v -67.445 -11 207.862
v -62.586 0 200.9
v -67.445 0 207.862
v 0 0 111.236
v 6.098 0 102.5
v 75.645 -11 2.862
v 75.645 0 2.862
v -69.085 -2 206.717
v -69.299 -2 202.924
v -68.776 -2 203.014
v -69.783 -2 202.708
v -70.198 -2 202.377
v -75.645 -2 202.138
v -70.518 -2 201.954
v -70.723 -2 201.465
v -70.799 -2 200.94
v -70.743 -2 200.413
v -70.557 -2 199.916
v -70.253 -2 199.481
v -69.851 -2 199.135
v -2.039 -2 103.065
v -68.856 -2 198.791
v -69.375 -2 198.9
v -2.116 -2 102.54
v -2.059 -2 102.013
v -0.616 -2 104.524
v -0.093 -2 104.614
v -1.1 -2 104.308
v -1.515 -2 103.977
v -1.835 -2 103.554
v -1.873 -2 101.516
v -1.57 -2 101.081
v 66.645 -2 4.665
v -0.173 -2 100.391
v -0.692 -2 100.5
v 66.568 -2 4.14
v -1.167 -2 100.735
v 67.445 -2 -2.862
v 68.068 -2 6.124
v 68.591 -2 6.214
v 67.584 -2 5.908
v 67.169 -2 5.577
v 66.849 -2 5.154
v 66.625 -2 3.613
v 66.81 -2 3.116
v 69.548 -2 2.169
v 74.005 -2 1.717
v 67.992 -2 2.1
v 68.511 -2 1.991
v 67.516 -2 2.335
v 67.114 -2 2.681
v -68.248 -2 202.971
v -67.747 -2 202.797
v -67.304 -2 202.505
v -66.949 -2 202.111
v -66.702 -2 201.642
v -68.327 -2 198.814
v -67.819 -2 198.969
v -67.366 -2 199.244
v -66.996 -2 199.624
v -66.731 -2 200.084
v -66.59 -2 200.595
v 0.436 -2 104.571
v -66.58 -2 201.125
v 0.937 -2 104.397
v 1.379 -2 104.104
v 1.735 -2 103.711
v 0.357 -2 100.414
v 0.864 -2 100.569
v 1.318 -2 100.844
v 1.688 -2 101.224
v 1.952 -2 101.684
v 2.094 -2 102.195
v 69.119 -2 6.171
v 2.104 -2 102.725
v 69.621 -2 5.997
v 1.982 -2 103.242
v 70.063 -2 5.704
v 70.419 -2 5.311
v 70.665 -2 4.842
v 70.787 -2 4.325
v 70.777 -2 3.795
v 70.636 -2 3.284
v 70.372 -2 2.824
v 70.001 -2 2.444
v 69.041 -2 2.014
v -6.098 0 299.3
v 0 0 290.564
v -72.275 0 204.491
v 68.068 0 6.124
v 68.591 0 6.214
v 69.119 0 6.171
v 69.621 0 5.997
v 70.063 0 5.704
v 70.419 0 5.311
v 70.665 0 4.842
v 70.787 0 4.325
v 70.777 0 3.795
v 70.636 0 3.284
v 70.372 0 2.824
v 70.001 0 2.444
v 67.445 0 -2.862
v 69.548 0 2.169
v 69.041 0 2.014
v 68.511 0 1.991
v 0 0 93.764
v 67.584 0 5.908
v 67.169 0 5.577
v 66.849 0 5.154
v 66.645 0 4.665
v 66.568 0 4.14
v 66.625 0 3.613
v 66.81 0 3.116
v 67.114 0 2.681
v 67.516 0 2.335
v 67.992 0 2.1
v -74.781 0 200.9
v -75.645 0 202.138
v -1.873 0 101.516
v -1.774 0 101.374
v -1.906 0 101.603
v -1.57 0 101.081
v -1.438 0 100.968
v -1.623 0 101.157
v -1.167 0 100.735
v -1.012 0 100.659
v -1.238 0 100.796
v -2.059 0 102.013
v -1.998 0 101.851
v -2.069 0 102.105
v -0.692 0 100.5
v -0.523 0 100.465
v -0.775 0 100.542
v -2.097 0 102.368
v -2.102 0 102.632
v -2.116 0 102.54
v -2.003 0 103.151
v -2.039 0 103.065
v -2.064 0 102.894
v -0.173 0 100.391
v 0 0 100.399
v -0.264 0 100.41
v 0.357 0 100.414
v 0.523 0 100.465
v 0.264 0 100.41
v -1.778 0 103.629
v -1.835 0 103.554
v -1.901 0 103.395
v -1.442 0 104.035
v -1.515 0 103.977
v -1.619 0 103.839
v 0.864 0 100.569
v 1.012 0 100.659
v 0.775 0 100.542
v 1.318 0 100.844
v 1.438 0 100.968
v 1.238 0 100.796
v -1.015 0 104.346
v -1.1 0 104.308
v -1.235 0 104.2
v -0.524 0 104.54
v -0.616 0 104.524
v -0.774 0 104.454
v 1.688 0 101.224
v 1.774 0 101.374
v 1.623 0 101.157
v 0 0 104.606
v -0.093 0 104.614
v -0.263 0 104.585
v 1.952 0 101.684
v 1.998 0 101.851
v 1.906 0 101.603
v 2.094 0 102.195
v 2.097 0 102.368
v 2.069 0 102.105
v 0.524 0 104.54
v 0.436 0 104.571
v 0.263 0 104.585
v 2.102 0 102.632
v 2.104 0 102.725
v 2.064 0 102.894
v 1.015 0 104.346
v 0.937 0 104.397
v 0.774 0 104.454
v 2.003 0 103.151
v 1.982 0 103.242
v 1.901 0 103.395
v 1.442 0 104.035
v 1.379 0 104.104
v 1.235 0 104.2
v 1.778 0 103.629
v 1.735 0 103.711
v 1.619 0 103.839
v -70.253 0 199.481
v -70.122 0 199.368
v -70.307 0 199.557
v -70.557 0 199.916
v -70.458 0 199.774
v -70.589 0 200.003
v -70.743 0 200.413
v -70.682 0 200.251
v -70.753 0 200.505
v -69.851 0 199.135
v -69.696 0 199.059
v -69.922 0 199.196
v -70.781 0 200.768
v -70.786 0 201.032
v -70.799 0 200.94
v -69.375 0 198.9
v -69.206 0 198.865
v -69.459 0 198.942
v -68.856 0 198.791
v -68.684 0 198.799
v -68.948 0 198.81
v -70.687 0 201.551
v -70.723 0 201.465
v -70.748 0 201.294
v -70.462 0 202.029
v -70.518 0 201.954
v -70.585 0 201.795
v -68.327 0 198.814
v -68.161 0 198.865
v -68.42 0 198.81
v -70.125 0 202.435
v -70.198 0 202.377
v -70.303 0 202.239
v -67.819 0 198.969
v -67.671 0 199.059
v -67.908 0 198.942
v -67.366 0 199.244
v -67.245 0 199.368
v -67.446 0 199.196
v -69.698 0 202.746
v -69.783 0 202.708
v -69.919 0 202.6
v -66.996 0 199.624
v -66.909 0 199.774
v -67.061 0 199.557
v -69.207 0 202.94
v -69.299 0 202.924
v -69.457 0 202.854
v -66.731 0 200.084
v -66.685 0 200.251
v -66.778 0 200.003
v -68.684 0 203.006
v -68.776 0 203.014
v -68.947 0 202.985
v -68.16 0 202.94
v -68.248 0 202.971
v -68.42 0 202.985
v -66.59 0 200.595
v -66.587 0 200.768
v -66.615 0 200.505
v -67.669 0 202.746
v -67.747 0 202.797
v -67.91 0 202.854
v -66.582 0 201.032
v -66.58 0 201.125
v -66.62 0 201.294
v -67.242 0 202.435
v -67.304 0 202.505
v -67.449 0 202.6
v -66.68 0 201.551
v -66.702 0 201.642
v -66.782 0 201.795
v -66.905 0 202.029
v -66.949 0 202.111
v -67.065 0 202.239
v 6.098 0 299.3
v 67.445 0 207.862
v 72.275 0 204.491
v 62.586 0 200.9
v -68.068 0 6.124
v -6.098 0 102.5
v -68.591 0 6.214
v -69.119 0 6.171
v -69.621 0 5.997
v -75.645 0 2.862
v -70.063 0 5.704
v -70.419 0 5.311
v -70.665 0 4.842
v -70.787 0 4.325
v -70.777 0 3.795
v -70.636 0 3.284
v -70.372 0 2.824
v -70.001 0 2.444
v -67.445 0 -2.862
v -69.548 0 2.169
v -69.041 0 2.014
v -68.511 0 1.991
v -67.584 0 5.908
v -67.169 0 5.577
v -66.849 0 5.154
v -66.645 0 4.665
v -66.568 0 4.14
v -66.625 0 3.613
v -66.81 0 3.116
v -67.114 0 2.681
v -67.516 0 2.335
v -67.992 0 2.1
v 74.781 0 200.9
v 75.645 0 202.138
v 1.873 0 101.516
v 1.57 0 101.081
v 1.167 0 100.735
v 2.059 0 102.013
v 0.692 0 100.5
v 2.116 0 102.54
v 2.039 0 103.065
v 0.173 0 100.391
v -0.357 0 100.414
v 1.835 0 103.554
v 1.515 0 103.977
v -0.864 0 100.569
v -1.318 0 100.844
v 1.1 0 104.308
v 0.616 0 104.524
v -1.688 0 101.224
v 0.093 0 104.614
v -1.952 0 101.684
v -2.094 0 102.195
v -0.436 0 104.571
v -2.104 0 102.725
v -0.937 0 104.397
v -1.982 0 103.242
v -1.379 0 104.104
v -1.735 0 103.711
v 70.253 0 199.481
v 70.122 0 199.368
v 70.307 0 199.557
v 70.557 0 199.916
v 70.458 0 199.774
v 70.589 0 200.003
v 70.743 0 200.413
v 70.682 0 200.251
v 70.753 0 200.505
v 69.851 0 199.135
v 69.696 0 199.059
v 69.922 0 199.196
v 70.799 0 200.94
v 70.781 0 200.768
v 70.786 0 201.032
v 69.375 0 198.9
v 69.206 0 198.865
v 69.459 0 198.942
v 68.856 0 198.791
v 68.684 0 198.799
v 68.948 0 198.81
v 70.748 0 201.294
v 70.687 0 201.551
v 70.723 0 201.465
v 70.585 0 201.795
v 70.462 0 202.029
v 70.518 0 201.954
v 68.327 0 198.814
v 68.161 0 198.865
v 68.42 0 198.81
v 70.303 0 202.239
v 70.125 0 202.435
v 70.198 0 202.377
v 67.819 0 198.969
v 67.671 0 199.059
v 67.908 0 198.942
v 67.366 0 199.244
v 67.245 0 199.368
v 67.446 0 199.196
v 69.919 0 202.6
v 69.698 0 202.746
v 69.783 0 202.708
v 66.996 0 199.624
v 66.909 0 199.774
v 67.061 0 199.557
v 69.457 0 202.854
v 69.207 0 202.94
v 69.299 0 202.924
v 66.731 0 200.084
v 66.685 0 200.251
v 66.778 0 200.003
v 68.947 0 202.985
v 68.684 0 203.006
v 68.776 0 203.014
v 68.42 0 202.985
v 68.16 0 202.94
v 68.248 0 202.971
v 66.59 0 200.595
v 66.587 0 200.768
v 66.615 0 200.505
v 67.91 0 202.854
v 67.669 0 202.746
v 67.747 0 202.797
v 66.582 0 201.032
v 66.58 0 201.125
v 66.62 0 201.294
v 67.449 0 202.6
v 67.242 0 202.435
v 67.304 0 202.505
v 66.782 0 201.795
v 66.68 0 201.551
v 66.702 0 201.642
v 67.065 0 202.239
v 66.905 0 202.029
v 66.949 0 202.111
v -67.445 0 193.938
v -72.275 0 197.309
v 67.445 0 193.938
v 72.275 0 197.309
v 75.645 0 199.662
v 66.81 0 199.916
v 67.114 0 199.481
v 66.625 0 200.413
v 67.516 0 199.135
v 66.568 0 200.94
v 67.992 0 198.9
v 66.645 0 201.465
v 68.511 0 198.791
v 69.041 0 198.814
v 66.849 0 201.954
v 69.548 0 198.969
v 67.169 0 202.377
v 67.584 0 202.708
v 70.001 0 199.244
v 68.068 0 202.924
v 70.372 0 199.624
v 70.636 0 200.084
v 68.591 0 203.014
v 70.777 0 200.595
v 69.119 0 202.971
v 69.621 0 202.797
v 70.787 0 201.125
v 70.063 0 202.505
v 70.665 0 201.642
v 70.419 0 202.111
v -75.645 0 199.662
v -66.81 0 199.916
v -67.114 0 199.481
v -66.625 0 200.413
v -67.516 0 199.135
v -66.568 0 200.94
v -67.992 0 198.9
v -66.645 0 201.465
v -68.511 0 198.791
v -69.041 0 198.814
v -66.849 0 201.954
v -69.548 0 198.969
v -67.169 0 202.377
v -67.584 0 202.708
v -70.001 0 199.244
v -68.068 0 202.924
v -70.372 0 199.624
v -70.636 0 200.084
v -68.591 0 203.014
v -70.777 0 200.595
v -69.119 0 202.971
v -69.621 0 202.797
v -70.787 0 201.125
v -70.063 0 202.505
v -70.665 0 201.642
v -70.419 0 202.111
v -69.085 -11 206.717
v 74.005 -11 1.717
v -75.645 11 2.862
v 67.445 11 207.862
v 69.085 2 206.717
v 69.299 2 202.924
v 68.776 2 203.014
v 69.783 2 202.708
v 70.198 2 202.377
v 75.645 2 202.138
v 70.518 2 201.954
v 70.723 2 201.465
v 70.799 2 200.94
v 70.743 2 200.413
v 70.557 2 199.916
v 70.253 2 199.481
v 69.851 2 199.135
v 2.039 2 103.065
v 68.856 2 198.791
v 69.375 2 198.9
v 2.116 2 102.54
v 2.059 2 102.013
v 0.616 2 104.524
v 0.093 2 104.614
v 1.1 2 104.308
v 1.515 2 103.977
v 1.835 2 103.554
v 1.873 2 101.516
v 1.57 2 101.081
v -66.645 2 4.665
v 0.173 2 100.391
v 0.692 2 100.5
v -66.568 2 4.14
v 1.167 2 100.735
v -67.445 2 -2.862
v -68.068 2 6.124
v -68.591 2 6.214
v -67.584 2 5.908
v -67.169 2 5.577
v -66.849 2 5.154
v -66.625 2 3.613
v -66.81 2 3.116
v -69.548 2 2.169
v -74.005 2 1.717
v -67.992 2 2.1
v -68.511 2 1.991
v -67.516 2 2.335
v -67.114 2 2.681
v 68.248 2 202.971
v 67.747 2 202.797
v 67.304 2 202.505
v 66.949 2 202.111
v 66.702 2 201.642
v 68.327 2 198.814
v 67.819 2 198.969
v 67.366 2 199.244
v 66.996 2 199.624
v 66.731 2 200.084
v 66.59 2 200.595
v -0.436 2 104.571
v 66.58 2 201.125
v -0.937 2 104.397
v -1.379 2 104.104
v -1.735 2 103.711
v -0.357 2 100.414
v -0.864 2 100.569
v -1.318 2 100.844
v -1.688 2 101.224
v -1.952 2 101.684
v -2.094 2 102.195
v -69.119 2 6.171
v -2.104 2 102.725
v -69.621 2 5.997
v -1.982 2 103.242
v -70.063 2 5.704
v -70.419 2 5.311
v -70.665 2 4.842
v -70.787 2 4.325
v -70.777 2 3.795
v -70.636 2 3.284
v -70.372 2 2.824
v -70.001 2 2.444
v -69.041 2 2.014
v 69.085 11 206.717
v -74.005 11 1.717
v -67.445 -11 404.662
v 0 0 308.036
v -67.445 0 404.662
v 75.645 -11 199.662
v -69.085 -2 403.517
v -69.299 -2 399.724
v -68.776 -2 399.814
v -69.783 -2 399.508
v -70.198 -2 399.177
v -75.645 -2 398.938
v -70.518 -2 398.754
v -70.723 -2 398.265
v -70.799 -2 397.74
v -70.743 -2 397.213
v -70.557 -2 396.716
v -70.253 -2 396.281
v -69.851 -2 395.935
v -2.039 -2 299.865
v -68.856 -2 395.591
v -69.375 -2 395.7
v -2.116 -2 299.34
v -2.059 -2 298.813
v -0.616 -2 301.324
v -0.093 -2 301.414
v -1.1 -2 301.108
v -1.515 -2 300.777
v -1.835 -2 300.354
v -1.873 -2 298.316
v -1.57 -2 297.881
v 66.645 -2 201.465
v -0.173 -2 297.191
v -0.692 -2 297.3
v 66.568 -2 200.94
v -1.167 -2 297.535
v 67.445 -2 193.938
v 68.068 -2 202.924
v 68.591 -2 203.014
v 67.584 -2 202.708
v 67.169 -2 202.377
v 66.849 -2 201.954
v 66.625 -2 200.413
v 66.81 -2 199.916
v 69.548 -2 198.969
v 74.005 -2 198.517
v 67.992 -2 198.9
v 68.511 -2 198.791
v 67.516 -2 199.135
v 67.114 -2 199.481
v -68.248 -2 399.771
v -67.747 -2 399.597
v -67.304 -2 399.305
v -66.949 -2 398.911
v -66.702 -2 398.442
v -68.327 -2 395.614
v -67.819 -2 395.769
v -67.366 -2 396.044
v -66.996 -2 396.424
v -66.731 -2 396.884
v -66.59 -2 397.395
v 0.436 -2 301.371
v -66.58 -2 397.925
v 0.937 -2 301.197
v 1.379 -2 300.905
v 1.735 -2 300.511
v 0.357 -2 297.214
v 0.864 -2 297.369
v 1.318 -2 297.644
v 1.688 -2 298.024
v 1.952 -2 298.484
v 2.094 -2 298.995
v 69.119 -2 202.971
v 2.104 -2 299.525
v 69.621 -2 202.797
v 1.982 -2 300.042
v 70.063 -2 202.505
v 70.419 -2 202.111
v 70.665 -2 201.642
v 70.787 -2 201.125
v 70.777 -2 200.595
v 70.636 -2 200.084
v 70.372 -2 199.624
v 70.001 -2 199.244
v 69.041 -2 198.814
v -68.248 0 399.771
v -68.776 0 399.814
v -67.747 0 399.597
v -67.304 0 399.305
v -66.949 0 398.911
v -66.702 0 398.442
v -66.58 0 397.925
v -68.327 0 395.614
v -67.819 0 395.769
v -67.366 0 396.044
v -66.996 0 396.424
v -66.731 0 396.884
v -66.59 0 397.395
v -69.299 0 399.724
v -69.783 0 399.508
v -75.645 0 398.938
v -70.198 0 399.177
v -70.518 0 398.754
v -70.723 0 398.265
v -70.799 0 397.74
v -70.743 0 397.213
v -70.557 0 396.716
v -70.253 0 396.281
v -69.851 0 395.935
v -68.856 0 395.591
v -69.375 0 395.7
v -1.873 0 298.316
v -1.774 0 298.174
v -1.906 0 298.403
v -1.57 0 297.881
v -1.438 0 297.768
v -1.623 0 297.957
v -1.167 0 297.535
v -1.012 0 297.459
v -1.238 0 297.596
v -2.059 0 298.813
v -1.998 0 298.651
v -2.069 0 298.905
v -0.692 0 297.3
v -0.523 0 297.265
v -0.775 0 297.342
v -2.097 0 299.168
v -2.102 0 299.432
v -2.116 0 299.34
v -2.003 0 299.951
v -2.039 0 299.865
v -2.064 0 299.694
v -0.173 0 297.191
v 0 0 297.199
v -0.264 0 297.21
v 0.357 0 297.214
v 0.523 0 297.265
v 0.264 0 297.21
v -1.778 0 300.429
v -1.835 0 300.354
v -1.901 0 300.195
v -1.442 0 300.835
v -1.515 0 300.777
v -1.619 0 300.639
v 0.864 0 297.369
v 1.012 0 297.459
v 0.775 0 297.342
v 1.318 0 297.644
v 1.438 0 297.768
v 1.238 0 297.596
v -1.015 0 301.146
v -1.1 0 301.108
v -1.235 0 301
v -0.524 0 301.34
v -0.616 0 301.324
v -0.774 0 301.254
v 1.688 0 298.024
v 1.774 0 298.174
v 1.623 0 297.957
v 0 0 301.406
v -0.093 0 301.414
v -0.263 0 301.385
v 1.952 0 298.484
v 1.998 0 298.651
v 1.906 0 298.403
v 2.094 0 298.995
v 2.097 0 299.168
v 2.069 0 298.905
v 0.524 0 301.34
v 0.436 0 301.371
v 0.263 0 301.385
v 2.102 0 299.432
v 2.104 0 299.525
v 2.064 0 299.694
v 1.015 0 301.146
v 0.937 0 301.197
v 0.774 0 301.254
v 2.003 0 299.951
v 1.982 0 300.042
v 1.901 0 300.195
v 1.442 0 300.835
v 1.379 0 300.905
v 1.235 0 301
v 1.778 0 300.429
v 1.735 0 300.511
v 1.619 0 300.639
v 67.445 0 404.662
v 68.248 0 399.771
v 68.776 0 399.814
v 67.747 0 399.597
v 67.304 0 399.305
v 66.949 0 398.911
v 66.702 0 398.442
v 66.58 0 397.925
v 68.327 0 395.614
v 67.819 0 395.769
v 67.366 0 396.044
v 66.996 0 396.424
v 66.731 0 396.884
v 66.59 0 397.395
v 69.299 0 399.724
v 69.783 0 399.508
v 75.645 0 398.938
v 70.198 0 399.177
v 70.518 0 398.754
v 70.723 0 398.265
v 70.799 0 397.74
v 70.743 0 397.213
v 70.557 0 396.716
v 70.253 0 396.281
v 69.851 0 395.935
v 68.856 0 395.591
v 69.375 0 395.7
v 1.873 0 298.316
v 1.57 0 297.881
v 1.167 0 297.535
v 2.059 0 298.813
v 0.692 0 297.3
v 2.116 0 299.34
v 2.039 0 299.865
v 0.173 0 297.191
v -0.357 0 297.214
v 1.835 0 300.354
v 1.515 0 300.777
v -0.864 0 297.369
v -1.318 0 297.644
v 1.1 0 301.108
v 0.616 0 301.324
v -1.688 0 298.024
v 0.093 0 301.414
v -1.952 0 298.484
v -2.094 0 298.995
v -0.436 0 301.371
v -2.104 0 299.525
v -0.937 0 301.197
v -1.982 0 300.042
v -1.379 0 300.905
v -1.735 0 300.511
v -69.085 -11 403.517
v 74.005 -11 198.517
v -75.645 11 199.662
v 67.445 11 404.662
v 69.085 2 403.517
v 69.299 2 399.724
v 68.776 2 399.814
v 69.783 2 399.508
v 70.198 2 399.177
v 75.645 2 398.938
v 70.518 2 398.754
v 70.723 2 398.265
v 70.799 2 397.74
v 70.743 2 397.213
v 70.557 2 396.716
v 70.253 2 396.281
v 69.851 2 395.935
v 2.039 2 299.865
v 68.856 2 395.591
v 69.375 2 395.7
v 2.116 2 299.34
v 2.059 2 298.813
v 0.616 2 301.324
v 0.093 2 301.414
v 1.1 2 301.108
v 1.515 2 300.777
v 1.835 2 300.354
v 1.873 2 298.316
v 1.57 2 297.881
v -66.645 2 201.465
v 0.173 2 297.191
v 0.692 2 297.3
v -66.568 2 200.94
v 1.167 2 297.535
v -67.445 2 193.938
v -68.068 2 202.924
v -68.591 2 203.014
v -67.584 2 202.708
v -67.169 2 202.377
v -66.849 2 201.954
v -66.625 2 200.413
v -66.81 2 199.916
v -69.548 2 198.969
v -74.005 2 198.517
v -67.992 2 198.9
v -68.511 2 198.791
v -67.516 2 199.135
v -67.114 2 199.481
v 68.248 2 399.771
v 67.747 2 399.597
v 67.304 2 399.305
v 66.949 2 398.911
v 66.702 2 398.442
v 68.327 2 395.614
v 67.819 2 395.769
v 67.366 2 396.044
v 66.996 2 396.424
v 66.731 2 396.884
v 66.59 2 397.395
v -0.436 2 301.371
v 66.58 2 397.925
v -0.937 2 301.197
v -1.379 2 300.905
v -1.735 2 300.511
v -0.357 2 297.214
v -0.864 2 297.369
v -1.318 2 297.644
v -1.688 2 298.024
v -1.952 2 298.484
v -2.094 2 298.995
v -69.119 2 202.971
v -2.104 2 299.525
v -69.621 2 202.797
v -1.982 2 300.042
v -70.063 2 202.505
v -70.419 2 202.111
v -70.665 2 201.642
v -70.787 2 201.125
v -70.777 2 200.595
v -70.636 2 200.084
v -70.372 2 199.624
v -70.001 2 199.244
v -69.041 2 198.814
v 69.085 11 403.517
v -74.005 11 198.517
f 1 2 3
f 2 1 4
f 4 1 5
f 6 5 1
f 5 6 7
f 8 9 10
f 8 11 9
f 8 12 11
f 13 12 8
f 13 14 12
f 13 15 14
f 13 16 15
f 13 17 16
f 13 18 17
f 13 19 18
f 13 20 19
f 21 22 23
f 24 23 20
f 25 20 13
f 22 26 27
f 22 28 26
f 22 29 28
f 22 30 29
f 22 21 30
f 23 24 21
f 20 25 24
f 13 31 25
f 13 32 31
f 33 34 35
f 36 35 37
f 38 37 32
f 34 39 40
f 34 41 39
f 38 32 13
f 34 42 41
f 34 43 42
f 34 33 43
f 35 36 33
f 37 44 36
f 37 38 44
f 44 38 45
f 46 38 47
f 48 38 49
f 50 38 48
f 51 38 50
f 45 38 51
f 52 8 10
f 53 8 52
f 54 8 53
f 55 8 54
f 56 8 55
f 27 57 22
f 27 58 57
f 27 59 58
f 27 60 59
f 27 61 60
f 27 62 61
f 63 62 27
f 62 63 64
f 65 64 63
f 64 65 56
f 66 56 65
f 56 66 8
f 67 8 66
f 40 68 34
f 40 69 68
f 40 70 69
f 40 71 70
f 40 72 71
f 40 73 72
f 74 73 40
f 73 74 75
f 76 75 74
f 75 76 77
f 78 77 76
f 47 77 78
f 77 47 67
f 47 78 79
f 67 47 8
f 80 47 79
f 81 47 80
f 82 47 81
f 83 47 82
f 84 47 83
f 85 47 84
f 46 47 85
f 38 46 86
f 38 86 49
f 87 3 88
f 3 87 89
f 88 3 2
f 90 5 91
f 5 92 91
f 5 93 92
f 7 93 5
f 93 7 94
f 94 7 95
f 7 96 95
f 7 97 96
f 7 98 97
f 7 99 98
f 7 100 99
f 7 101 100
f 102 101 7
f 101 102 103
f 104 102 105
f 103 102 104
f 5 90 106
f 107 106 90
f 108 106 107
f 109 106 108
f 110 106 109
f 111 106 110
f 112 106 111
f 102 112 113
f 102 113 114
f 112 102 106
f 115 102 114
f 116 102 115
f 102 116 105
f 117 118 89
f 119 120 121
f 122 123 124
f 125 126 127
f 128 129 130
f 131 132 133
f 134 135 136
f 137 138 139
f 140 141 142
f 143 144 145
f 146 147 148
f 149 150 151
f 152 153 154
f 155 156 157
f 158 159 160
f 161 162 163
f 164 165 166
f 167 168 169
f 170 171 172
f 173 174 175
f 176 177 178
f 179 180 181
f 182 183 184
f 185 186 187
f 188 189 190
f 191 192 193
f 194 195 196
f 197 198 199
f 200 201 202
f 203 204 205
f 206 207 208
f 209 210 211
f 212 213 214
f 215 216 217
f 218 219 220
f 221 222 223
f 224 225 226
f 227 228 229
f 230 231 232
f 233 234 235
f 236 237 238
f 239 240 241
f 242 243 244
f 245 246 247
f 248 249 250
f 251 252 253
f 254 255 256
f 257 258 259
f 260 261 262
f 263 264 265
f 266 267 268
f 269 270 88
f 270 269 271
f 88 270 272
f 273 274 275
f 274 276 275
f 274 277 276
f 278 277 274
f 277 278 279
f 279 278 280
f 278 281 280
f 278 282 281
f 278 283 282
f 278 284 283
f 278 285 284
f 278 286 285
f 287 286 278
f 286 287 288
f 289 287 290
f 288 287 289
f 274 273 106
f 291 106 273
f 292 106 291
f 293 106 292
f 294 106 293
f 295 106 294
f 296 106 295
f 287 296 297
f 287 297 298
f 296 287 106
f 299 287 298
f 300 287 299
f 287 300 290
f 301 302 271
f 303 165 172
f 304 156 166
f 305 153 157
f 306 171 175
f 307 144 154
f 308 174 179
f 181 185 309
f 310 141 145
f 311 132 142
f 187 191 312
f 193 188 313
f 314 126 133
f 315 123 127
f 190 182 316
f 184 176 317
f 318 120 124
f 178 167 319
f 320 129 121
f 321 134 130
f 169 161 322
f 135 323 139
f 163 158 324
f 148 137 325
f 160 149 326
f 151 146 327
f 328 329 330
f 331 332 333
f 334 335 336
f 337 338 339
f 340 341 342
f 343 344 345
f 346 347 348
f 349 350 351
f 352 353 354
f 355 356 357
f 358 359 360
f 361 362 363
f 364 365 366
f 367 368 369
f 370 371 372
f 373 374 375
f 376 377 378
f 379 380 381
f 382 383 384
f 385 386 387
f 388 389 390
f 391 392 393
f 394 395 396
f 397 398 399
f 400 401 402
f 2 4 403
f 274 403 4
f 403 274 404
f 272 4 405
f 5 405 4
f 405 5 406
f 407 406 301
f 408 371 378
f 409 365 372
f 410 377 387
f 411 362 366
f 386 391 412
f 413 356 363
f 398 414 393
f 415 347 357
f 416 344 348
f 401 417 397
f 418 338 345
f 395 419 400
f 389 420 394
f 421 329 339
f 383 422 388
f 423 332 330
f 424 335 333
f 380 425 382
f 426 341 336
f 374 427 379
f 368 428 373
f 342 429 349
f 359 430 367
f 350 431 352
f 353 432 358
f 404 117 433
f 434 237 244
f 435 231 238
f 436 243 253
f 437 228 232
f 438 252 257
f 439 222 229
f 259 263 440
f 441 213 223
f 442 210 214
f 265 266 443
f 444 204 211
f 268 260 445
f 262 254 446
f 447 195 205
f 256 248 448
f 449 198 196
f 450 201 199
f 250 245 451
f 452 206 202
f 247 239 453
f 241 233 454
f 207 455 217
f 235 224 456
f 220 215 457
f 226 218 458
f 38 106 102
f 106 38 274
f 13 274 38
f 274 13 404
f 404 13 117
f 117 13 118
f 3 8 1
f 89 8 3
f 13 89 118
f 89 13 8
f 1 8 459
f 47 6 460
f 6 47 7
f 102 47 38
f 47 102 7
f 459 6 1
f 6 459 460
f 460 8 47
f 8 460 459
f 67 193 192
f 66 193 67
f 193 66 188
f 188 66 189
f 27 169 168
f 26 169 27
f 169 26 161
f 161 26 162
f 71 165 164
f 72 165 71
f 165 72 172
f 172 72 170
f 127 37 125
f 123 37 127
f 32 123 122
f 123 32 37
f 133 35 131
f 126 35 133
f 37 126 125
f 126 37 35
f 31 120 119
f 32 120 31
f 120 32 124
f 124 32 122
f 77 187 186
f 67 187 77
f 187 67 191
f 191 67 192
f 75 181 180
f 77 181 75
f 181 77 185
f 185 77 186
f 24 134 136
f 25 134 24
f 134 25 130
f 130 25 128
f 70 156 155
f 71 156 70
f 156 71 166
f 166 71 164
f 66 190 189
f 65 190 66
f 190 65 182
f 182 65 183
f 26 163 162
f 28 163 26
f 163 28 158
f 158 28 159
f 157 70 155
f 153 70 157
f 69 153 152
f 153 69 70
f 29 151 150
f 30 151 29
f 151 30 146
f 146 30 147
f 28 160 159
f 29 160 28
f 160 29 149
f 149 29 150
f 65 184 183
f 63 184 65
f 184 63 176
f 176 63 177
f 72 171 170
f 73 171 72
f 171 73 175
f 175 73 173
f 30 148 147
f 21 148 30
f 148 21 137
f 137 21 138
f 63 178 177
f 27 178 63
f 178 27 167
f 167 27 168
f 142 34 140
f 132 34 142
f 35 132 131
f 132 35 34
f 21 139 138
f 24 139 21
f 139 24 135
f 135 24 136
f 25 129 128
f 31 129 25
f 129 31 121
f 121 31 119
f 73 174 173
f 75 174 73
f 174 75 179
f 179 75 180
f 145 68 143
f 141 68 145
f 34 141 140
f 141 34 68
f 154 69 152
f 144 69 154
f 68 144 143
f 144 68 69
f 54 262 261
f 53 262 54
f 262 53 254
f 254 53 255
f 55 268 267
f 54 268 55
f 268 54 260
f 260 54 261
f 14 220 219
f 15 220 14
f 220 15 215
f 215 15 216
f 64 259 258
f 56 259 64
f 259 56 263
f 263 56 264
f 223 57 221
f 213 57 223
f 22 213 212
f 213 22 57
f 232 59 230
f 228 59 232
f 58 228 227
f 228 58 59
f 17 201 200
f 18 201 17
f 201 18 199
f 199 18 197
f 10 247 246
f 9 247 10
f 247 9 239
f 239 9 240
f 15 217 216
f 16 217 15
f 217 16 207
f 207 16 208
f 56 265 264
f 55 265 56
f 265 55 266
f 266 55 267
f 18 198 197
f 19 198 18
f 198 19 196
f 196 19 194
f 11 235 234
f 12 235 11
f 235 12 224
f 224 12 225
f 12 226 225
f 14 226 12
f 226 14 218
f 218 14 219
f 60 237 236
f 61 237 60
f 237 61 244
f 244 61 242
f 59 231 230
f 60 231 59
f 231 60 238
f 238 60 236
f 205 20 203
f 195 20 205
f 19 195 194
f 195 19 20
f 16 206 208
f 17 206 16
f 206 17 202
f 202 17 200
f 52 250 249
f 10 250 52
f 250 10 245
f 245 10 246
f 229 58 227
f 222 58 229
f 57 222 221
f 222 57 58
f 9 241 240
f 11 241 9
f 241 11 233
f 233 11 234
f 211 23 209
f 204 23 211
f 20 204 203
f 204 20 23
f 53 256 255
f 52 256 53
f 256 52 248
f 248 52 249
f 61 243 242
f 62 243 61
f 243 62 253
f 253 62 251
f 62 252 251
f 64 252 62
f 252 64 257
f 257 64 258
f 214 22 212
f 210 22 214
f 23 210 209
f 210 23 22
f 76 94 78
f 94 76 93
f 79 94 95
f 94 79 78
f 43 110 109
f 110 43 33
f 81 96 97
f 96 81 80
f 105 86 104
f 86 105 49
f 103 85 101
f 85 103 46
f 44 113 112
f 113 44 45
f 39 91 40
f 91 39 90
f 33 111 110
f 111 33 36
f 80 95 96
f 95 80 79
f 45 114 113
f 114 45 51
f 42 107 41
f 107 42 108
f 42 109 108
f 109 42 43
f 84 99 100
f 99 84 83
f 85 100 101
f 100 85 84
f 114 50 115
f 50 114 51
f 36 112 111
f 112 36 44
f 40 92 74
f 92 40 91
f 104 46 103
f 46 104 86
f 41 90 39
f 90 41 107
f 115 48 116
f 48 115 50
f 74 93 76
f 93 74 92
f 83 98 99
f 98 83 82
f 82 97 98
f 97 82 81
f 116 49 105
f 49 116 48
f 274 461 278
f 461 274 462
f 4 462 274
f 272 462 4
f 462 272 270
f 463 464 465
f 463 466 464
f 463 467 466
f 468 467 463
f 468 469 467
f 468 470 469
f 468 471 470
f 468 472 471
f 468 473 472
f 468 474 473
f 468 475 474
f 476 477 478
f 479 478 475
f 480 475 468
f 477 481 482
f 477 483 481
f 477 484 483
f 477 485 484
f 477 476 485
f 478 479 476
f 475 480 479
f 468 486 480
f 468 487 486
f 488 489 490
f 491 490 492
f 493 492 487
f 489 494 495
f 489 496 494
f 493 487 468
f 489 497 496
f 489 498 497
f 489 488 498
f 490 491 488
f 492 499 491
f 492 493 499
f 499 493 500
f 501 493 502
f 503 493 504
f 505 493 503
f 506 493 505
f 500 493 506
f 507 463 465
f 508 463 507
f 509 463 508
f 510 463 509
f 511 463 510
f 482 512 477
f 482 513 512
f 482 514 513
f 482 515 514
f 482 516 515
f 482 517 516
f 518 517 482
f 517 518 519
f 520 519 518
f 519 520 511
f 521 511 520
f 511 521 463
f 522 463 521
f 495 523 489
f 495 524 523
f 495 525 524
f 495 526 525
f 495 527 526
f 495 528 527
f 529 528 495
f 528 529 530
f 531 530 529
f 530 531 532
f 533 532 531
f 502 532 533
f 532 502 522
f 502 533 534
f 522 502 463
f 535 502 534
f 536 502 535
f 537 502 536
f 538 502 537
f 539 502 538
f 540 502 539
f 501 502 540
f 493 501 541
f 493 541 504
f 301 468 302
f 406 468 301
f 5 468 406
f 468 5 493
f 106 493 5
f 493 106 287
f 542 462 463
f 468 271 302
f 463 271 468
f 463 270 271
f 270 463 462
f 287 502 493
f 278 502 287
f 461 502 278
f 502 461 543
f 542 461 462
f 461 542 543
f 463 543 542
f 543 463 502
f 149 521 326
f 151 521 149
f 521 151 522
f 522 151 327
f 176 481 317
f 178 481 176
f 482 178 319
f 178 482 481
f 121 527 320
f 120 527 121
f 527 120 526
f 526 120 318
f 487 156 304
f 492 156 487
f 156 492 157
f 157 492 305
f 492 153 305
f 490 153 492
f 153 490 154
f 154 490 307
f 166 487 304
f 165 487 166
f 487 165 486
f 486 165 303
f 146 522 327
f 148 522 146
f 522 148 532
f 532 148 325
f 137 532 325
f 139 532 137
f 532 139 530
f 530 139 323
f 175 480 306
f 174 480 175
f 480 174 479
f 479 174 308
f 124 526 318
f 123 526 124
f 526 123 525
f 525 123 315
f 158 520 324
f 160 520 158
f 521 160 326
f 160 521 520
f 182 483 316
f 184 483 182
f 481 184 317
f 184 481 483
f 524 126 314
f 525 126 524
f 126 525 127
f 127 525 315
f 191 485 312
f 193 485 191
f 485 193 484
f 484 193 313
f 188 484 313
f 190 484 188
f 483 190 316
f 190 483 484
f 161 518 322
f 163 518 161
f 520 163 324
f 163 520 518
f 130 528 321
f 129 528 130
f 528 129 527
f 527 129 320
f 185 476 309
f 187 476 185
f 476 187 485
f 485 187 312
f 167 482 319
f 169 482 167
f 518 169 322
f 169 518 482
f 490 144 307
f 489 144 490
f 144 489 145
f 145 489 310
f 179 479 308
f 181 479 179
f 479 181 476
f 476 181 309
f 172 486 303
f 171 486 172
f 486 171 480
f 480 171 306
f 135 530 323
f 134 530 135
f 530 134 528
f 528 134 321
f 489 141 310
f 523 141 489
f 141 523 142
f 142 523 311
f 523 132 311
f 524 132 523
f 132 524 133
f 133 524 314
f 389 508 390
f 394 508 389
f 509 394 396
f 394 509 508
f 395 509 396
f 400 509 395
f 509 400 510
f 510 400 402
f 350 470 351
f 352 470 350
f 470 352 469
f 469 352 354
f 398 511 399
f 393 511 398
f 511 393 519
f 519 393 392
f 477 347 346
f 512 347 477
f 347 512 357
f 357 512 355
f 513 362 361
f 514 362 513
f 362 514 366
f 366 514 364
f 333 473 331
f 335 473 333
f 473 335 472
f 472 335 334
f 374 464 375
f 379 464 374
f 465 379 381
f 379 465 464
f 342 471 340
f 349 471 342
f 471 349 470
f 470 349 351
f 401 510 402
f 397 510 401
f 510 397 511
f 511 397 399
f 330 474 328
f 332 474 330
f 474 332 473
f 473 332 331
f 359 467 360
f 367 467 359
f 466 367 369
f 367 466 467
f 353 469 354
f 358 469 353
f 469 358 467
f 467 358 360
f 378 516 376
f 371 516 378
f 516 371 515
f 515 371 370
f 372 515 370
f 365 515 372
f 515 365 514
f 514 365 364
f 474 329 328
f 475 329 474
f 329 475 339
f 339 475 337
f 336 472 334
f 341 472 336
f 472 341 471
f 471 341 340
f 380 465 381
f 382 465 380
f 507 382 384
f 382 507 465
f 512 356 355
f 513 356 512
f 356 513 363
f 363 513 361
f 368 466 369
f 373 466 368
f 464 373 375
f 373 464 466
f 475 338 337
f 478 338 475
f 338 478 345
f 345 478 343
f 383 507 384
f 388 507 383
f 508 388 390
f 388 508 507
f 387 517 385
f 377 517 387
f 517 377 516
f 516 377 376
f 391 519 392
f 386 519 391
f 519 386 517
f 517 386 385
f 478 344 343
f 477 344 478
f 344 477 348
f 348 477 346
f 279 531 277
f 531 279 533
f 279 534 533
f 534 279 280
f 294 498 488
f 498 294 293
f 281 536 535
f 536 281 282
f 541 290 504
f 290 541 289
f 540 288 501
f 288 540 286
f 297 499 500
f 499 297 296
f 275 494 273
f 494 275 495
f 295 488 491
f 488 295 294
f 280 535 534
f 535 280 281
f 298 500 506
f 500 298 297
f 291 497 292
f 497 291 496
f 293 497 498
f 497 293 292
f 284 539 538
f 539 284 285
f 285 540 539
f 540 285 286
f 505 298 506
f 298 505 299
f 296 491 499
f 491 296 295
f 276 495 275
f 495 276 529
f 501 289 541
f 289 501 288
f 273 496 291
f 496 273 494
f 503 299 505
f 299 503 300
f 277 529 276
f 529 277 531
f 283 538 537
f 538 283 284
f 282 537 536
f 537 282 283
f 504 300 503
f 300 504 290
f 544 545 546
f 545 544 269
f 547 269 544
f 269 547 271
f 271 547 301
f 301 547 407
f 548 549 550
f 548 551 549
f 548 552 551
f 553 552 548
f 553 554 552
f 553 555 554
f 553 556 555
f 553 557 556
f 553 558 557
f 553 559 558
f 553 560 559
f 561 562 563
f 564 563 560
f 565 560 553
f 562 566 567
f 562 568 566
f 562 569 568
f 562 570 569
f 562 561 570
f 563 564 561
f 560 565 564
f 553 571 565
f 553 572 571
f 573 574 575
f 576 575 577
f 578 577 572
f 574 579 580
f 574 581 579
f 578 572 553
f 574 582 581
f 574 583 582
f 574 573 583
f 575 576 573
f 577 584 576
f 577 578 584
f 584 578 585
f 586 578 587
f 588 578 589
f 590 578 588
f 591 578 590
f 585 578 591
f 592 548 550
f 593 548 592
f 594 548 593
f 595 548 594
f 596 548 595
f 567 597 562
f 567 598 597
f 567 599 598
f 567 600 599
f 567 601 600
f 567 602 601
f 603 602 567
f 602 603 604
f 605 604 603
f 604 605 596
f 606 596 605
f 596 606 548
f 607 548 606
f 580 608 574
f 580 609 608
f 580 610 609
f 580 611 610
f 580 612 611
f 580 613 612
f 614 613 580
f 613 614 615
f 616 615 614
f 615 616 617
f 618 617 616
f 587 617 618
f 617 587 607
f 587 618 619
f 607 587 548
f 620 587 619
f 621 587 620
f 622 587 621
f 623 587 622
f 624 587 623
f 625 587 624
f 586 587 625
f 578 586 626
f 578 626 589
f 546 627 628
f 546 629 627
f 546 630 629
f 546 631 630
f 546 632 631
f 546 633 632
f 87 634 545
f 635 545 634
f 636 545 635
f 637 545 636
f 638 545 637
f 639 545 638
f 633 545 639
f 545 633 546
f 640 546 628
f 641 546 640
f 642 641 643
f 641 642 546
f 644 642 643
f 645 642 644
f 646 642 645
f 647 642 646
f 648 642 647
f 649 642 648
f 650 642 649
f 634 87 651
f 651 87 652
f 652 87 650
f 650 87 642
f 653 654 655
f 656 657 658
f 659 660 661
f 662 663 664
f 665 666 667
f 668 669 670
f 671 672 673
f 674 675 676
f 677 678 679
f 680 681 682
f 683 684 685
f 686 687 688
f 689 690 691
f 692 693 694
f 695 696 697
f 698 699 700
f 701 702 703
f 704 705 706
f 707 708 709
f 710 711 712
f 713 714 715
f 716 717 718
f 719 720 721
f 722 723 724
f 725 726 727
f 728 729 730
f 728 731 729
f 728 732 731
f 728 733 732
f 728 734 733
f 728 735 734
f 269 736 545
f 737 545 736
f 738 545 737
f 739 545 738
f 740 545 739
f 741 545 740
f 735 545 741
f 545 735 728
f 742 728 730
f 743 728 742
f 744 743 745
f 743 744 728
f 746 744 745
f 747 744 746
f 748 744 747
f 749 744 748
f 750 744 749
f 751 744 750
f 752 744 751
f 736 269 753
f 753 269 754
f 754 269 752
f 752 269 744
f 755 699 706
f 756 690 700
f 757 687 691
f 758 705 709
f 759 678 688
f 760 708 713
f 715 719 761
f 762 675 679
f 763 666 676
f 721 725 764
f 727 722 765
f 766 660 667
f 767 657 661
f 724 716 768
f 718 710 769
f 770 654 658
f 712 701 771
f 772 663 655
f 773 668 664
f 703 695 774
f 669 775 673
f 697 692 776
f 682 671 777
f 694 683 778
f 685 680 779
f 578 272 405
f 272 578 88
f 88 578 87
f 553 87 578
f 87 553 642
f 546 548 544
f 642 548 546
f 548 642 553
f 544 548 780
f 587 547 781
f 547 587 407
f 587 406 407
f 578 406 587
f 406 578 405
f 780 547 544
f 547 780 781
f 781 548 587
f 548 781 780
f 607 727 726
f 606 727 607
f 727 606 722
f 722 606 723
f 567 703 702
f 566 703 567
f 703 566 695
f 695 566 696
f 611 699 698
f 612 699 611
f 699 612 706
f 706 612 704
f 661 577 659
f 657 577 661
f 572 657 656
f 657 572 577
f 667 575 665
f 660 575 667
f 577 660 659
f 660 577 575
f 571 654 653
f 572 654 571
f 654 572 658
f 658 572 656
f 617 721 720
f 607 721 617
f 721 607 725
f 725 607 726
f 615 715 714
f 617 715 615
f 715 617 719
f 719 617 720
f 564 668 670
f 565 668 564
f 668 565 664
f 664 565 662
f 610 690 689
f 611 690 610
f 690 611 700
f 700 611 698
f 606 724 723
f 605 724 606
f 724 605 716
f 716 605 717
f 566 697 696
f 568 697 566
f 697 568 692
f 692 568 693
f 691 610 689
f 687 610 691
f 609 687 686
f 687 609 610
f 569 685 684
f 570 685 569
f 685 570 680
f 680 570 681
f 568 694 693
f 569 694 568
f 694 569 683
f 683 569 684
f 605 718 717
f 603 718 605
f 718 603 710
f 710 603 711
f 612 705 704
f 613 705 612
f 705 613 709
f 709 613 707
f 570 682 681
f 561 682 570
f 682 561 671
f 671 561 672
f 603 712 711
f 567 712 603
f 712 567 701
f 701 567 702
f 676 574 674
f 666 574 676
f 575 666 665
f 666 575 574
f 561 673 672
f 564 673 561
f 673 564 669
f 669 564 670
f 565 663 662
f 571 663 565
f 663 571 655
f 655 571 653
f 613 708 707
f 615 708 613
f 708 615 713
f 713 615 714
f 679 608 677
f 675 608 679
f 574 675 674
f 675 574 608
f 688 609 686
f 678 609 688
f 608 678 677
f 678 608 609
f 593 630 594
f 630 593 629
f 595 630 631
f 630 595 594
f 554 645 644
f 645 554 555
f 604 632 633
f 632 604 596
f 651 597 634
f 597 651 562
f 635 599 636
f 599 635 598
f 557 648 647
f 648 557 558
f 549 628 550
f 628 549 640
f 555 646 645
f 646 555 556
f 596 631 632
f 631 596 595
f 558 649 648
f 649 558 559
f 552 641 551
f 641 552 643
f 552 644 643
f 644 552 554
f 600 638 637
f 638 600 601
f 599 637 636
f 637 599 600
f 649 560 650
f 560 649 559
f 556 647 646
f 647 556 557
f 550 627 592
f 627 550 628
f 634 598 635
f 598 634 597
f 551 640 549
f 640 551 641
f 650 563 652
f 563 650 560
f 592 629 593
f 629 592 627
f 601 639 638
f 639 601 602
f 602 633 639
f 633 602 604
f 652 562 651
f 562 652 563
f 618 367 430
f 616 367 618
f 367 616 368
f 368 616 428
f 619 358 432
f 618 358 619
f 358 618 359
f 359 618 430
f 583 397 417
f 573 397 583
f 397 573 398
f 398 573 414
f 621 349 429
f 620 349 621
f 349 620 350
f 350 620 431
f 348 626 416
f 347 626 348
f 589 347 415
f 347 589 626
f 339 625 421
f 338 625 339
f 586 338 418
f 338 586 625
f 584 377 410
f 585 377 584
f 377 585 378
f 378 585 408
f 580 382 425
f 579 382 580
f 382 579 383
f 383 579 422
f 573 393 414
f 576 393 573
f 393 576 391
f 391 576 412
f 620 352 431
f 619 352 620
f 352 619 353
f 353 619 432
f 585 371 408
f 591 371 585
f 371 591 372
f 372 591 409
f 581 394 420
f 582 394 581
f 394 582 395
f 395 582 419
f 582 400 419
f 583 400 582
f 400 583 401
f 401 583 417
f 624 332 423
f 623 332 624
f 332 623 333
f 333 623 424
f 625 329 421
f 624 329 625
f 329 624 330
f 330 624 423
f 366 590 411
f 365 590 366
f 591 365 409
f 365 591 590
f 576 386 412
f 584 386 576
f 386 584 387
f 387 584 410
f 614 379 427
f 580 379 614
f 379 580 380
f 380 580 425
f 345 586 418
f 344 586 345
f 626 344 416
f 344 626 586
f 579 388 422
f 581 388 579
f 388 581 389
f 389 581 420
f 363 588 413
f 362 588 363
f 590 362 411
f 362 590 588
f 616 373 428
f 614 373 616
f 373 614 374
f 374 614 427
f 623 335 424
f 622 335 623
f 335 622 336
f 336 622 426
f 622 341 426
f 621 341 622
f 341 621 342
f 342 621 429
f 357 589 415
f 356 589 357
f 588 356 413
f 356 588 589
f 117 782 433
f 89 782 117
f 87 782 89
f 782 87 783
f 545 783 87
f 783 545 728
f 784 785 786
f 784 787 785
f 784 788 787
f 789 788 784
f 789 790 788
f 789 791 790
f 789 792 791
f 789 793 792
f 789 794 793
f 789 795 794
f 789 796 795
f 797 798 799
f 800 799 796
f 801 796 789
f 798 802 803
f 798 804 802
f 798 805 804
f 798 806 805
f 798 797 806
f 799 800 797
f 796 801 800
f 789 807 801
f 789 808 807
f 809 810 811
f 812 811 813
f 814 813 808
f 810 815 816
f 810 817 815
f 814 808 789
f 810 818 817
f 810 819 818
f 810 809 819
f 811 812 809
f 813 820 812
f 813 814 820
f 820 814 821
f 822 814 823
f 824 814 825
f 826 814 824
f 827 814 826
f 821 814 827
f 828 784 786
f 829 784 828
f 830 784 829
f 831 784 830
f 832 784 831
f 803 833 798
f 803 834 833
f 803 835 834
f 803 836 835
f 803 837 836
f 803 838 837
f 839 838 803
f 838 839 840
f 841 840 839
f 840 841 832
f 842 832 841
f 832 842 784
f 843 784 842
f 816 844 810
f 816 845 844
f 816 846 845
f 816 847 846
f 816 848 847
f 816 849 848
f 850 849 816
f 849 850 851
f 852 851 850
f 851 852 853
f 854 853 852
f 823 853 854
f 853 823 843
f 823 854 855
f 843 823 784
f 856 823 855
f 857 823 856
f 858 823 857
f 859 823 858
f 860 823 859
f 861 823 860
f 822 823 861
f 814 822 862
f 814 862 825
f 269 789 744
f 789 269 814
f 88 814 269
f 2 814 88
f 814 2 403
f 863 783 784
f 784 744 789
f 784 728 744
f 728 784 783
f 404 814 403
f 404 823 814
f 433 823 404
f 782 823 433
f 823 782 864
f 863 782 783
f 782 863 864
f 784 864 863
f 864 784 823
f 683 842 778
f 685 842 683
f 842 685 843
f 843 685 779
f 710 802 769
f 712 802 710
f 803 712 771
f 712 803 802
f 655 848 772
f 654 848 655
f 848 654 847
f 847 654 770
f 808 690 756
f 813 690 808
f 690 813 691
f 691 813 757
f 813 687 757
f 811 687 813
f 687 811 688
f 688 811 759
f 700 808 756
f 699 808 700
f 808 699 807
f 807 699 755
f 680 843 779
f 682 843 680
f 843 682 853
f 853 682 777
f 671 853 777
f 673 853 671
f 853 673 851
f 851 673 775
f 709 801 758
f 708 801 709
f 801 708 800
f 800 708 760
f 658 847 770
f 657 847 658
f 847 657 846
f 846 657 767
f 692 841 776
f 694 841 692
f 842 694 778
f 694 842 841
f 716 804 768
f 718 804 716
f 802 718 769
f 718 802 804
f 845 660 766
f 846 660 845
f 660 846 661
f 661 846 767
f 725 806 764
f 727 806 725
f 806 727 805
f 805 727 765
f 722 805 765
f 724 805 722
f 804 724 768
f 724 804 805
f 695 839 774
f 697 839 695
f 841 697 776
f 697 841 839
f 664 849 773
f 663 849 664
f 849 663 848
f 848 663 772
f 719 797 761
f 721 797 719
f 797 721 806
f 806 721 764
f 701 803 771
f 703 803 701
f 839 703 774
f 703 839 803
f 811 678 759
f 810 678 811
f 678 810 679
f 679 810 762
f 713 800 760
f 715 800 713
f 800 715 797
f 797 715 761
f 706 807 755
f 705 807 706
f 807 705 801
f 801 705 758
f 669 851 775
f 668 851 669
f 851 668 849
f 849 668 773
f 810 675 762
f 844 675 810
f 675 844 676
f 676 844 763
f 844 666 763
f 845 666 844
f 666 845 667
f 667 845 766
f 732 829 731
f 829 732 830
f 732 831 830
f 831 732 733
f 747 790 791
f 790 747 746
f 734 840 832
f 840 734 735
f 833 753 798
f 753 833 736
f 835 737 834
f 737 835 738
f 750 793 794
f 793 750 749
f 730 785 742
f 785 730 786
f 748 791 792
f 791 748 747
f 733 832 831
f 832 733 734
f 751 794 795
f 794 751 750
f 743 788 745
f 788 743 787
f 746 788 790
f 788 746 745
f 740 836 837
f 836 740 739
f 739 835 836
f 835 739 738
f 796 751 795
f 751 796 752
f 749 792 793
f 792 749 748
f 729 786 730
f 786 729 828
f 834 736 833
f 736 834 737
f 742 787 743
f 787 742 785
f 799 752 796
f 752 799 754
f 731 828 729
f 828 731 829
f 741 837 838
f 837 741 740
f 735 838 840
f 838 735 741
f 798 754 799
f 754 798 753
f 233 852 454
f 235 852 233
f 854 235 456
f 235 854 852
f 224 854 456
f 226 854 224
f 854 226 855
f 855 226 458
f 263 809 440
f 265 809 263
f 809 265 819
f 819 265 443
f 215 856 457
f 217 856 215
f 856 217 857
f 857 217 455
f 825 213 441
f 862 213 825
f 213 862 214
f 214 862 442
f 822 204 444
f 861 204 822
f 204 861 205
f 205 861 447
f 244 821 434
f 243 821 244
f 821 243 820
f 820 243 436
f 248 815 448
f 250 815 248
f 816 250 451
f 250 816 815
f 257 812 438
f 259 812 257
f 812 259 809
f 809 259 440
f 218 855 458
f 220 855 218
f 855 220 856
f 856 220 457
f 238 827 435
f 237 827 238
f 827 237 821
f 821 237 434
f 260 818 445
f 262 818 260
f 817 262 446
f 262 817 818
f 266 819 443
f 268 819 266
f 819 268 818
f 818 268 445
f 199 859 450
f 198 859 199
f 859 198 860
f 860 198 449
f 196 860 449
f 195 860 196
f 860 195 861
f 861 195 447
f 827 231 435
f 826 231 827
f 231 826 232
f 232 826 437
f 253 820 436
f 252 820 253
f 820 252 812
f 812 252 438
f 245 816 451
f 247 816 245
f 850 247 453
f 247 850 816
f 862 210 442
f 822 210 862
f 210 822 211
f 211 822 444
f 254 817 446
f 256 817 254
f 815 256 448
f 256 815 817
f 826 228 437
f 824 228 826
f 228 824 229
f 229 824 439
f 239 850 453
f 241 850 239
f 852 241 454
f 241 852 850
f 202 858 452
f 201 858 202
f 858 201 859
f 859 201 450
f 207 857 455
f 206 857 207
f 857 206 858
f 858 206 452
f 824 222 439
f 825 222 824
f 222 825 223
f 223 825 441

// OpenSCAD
// file: myLibs.scad
pi= 3.14159265359;

module hole(diam, height, clearance= 0.1)
{
        fn= round(diam * pi / 0.5);
        cylinder(h= height, r=diam / 2 / cos(180 / fn) + clearance, $fn=fn);
}

module nutTrap(ffd, faces=6, height=1)
{
	cylinder(h= height, r=ffd / cos(180 / faces) / 2 + 0.05, $fn=faces);
}

// A slot which has rounded ends, but total length is l
module slot(d= 4, l= 8, ht= 1, clearance=0.1) {
	fn= round(d * pi / 0.5);
	rd= d / 2 / cos(180 / fn) + clearance;
	d1= rd*2;
	union() {
		translate([0,0,ht/2]) cube([l-d1, d1, ht], center=true);
		translate([-(l-d1)/2, 0, ht/2]) cylinder(h=ht, r=rd, $fn=fn, center=true); 
		translate([(l-d1)/2, 0, ht/2]) cylinder(h=ht, r=rd, $fn=fn, center=true); 
	}
	
}
// main file
use <myLibs.scad>

bracket_length= 250;

//translate([-get_width()/2,0,0]) angle_bracket(200);

//scissor_angle(70);

//scissors(300*$t);

scissor_lift(410);

function get_width()= 10;
function get_hole_pos()= 5;
function distance(a,l)= cos(a)*l;

// return angle required to get given height
function scissor_height(h,l)= acos((h/4)/(l/2));

module angle_bracket(l=100) {
	w= get_width();
	h= 10;
	t= 2;
	translate([0,0,t/2]) {
		difference() {
			union() {
				cube([w,l,t], center=true);
				translate([w/2-t/2,0,h/2]) cube([t,l,h], center=true);
			}
			translate([0,0,-5]) hole(4, 10);
			translate([0,l/2-get_hole_pos(),-5]) hole(4, 10);
			translate([0,-l/2+get_hole_pos(),-5]) hole(4, 10);
		}
	}
}

module scissor(angle= 45, l= 200) {
	rotate([0,0,angle]) angle_bracket(l);	
	translate([]) rotate([0,180,-angle]) angle_bracket(l);
}

module scissor_angle(a, l=200) {	
	scissor(a,l);
	translate([0,distance(a,l/2-get_hole_pos())*2,0]) scissor(a,l);
}

module scissors(h) {
	l= bracket_length;
	a= scissor_height(h, l);
	translate([0,distance(a,l/2),0]) scissor_angle(a, l);
}

module scissor_lift(h) {
	rotate([90,0,0]) scissors(h);
}
